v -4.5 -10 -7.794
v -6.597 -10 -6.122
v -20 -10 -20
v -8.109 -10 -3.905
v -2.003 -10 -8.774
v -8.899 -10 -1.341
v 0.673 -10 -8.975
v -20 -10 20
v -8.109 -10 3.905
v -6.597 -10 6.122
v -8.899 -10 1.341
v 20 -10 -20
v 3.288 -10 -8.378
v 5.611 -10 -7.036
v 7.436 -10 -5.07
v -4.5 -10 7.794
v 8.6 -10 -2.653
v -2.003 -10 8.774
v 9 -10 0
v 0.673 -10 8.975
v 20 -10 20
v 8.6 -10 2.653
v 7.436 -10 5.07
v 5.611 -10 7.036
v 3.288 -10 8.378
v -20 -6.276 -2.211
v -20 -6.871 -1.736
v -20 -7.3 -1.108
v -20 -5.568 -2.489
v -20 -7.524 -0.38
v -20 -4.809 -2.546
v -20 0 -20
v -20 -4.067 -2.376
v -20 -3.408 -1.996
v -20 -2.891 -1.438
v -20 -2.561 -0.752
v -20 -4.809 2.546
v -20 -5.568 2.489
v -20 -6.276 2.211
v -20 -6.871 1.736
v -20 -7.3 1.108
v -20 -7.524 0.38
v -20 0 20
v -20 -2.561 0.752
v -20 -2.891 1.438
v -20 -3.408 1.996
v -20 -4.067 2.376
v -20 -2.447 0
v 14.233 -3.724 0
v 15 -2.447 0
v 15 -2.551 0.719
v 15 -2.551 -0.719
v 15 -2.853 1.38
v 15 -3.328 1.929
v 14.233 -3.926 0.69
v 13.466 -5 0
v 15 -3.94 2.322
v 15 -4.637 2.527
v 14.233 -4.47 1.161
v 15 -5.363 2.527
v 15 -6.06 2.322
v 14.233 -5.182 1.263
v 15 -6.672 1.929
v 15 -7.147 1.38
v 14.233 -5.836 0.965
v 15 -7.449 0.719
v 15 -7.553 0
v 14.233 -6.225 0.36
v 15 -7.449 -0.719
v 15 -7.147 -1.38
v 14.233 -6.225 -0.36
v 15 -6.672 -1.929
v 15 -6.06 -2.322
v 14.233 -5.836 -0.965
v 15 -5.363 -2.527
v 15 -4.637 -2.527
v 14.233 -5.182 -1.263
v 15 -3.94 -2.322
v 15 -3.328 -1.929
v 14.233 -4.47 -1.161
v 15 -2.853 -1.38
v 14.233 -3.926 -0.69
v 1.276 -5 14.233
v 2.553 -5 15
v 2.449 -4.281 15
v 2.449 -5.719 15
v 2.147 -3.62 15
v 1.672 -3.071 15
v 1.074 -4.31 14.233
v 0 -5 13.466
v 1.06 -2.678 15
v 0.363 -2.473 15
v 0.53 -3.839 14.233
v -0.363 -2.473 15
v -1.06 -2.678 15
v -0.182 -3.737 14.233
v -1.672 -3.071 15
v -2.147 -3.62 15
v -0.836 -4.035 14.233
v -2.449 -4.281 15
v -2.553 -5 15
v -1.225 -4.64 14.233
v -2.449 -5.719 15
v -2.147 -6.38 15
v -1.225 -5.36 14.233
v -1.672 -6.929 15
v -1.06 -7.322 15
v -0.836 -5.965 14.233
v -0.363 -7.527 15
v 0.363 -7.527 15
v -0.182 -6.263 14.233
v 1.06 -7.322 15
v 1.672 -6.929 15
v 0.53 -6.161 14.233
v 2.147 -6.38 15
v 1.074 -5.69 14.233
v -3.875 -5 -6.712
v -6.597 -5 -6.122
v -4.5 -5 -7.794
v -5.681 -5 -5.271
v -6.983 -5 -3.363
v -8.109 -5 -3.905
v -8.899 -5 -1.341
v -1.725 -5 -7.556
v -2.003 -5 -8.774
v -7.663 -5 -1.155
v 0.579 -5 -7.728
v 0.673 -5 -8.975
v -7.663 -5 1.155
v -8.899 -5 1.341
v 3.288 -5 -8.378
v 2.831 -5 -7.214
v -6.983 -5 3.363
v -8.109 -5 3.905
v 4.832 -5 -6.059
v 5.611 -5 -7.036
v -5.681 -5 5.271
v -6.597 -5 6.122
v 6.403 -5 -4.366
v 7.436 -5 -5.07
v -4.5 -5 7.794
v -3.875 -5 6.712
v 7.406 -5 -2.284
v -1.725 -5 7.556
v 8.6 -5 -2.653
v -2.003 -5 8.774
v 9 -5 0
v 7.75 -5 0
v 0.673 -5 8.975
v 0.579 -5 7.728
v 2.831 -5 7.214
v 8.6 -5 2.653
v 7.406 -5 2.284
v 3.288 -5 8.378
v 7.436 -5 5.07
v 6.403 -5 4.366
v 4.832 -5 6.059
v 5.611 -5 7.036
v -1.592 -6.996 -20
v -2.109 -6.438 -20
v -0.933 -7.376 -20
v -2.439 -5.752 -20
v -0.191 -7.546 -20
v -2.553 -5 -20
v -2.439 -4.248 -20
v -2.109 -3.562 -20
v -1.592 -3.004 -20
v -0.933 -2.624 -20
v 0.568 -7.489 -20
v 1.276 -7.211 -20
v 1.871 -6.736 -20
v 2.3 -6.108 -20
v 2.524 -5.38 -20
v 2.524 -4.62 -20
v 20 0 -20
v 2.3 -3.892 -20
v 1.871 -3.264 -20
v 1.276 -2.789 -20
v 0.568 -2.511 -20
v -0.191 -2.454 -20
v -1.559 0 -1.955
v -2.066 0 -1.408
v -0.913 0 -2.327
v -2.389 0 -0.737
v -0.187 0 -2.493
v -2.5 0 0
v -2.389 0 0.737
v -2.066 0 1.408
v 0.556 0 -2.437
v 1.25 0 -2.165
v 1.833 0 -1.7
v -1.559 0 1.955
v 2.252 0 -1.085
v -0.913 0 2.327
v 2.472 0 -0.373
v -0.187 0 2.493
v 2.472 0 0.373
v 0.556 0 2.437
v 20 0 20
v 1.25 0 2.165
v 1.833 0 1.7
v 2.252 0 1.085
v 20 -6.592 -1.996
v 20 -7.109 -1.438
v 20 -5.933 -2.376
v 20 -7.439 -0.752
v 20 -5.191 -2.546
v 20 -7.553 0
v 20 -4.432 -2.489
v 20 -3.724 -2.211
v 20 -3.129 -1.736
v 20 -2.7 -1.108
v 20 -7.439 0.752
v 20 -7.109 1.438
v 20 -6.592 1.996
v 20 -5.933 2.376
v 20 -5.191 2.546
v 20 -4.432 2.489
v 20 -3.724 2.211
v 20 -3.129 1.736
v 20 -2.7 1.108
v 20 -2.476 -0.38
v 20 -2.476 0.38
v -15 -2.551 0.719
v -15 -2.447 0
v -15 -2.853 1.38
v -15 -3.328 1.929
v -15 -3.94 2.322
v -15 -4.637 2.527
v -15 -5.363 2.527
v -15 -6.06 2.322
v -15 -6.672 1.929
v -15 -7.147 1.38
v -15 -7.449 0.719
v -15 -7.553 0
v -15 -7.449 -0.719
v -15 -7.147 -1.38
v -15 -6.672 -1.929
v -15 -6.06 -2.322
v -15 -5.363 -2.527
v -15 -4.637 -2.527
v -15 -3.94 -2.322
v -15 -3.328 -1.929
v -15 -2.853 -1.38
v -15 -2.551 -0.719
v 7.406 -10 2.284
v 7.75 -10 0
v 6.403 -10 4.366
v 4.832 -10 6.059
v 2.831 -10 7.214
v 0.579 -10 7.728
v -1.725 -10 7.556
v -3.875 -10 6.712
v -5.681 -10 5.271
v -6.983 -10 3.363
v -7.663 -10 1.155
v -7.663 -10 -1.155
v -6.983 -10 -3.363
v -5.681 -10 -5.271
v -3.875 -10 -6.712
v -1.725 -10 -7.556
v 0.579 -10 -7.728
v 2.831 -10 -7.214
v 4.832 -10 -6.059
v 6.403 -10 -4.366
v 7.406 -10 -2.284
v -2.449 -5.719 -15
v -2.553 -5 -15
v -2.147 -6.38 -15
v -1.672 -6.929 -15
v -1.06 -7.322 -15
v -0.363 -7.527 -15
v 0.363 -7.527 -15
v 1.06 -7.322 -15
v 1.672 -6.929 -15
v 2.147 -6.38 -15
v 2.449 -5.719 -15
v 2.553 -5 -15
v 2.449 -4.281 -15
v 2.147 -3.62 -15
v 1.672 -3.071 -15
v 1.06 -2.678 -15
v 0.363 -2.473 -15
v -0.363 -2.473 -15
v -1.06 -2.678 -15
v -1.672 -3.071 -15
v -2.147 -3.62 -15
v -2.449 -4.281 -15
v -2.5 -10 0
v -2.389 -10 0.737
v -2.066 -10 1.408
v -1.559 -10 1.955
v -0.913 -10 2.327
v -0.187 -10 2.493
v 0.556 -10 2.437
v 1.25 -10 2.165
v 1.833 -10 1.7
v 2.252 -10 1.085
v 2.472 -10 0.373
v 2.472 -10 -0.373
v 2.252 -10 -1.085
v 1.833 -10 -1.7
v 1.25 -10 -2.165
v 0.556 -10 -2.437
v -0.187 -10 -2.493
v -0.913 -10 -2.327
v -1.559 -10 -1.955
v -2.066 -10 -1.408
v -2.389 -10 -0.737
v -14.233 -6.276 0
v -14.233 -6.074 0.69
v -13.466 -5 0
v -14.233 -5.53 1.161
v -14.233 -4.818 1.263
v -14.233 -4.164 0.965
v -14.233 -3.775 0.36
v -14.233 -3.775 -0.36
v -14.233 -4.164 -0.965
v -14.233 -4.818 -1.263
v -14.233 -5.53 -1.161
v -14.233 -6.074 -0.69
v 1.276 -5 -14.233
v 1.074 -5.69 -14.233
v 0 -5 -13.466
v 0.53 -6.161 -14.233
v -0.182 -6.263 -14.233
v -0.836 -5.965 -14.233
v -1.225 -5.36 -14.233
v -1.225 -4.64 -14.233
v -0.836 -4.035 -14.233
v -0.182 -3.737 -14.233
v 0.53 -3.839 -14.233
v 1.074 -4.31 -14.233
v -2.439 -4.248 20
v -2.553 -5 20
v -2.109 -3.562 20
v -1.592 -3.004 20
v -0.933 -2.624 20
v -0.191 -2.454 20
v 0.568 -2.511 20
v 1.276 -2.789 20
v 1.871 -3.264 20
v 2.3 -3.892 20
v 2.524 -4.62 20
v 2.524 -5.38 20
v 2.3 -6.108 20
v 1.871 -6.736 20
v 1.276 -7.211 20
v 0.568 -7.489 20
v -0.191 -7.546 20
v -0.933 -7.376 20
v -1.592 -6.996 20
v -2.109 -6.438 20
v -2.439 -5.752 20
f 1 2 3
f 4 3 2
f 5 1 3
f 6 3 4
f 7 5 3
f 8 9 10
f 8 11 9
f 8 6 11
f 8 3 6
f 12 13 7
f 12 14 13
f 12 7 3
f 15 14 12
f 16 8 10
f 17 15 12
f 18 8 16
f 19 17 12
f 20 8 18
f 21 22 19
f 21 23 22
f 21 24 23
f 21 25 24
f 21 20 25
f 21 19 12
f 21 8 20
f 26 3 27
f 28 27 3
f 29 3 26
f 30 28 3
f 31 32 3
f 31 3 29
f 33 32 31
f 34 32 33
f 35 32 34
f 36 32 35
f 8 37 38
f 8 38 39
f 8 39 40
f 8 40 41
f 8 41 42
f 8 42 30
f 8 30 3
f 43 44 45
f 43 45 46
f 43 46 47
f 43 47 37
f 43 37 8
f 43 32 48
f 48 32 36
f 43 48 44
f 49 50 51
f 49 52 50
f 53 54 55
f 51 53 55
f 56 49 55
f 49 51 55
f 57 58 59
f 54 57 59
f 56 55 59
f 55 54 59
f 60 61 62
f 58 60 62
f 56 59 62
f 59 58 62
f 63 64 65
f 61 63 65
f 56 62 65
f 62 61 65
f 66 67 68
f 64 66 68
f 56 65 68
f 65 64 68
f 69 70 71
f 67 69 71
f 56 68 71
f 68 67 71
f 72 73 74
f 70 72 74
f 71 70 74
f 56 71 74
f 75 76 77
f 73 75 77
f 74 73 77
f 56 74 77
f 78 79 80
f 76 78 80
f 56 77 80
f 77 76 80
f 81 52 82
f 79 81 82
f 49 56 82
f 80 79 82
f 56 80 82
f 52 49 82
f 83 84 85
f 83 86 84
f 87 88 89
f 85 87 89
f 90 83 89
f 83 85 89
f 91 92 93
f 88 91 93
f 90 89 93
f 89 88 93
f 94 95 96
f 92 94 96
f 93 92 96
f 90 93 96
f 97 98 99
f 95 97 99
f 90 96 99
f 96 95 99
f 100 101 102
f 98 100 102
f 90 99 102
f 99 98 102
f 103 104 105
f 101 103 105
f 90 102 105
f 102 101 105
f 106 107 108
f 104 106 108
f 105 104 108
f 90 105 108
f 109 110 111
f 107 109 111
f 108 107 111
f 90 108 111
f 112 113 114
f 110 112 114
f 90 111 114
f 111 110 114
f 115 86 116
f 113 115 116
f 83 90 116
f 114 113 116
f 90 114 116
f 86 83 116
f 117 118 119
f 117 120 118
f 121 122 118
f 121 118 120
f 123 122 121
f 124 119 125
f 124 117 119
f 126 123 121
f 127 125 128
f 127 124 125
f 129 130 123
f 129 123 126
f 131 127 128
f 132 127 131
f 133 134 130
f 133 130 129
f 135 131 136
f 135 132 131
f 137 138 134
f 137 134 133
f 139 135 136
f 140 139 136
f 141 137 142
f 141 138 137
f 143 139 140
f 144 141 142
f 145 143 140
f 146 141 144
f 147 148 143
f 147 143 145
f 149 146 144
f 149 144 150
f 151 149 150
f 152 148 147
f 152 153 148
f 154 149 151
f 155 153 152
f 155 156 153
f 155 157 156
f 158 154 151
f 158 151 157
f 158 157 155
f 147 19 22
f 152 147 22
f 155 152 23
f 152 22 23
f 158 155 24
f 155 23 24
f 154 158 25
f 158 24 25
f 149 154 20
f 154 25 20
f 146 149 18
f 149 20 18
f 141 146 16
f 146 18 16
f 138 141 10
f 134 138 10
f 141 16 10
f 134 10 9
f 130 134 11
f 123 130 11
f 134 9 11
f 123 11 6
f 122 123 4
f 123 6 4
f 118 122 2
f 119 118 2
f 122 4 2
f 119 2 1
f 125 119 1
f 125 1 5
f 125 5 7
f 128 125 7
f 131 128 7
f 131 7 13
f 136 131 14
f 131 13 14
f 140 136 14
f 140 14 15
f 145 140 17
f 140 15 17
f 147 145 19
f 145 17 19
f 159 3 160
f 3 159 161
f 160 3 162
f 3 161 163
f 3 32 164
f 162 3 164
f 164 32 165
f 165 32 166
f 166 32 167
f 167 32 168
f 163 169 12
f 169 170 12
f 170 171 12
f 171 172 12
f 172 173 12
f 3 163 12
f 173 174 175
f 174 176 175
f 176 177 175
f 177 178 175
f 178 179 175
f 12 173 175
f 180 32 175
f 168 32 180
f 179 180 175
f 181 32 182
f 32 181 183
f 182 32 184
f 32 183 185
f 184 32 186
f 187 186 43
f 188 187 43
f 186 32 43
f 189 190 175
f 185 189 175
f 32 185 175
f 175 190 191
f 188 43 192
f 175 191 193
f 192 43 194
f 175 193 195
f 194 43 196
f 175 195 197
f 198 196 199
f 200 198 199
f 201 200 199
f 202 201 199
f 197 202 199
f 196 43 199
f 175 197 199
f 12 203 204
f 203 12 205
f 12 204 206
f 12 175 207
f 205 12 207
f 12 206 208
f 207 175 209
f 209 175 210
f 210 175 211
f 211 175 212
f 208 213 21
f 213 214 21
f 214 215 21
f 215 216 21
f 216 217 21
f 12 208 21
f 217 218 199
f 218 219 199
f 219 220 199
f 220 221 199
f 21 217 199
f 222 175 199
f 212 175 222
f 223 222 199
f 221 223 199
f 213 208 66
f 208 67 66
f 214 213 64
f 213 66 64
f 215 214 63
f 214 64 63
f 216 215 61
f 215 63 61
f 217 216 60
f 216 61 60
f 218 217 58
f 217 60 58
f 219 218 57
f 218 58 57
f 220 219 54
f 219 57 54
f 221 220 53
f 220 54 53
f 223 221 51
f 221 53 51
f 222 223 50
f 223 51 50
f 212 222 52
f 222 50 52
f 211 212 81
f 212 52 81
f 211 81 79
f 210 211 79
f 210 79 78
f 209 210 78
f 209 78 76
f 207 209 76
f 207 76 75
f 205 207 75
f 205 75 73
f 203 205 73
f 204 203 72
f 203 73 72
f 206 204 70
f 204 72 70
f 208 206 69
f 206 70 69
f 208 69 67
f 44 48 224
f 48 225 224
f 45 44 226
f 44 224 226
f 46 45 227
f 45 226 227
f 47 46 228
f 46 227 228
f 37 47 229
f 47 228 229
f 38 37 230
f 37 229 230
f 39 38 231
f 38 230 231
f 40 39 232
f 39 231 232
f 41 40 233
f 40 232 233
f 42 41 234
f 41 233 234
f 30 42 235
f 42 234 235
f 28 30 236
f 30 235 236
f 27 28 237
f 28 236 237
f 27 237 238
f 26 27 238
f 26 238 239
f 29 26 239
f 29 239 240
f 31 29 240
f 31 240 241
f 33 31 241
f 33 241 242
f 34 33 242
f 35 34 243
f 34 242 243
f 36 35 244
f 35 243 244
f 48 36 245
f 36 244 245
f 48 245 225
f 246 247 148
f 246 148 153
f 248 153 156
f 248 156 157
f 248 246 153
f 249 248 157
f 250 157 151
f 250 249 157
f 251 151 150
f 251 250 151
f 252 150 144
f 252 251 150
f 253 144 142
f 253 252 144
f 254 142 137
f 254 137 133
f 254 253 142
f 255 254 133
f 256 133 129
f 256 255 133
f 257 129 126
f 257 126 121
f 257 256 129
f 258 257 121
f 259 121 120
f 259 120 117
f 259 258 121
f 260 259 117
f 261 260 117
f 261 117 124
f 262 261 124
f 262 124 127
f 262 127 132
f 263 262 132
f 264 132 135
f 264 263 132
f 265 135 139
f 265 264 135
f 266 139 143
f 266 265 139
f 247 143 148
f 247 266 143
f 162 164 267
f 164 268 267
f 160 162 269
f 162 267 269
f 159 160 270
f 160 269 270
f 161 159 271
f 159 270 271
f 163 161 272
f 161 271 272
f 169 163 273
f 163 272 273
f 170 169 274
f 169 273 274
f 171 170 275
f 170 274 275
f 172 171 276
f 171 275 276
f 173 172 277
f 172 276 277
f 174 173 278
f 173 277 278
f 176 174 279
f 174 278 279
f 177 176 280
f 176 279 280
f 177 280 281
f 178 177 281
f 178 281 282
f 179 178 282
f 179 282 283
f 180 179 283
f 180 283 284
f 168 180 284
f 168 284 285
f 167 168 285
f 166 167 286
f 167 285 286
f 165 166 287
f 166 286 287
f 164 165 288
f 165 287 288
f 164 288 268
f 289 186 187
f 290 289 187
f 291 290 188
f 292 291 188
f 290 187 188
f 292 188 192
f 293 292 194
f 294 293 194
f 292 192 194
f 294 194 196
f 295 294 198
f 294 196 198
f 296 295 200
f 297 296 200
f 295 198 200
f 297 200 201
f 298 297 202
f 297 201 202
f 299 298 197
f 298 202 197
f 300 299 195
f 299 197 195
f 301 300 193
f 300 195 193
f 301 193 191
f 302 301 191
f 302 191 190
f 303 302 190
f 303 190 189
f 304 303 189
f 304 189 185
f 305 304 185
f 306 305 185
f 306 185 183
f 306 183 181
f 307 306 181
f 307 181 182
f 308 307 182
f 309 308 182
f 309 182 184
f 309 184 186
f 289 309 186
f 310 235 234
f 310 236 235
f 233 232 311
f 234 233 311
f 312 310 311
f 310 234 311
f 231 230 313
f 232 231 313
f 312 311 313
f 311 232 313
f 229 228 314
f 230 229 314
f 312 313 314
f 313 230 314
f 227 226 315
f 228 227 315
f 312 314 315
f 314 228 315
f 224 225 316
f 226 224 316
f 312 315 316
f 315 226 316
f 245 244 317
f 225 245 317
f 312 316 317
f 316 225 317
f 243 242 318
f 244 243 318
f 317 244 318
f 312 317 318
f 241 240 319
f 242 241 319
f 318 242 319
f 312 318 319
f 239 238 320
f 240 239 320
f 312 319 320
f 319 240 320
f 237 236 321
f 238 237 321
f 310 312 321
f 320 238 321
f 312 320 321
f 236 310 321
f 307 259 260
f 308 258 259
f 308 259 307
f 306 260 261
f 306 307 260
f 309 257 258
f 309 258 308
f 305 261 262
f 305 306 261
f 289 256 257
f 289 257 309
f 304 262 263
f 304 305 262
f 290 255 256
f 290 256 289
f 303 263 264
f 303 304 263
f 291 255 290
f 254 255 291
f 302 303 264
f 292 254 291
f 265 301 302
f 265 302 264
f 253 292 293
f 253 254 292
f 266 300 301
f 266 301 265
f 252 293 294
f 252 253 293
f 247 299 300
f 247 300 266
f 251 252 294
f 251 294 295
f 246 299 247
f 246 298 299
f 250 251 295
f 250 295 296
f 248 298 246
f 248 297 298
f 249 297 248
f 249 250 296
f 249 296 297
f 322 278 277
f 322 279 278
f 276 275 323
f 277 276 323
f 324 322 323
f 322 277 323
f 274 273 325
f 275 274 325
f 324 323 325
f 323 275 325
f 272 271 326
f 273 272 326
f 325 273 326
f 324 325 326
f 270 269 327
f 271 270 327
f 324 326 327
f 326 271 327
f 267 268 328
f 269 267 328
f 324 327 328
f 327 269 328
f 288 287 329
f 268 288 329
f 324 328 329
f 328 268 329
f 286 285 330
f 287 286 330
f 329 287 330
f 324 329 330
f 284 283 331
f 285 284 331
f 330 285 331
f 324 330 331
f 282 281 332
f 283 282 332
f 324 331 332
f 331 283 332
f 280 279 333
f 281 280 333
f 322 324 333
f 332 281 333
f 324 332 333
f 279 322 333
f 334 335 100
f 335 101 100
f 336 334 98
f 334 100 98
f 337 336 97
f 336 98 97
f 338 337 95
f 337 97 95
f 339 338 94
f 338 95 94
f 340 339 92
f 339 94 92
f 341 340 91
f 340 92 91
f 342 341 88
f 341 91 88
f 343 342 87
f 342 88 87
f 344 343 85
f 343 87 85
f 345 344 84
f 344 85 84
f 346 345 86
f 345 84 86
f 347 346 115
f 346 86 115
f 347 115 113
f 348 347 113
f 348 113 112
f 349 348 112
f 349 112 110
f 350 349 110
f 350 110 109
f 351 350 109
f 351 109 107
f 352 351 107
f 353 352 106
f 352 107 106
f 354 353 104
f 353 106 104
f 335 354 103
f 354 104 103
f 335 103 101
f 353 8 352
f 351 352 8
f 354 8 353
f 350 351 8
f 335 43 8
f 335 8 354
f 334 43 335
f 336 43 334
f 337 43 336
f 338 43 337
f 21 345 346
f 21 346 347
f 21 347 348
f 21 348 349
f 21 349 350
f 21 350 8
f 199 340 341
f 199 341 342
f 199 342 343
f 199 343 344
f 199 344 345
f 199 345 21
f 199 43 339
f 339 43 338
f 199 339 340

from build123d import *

# Parameters (mm, degrees)
F0_W      = 40
F0_H      = 40
F1_DEPTH  = 10
F3_D      = 5
F4_R      = 9
F4_R_2    = 7.75
F5_DEPTH  = 5
F7_D      = 5.1054
F7_DEPTH  = 5
F7_TIP    = 1.5338169022
F9_D      = 5.1054
F9_DEPTH  = 5
F9_TIP    = 1.5338169022
F11_D     = 5.1054
F11_DEPTH = 5
F11_TIP   = 1.5338169022
F13_D     = 5.1054
F13_DEPTH = 5
F13_TIP   = 1.5338169022


with BuildPart() as f1:
    # F0 (on Front) → F1 (new body)
    with BuildSketch(Plane.XZ):
        Rectangle(F0_W, F0_H)
    extrude(amount=F1_DEPTH)

    # F3 (through all)
    with Locations(Plane.XZ.offset(10)):
        with Locations((0, 0)):
            Hole(F3_D / 2)

    # F4 (on face) → F5 (cut)
    with BuildSketch(Plane.XZ.offset(10)):
        Circle(F4_R)
        Circle(F4_R_2, mode=Mode.SUBTRACT)
    extrude(amount=-F5_DEPTH, mode=Mode.SUBTRACT)

    # F7
    with Locations(Plane.XY.offset(20)):
        with Locations((0, -5)):
            Hole(F7_D / 2, depth=F7_DEPTH)
            with Locations((0, 0, -(F7_DEPTH + F7_TIP / 2))):  # 118° drill point
                Cone(0, F7_D / 2, F7_TIP, mode=Mode.SUBTRACT)

    # F9
    with Locations(Plane(origin=(0, 0, -20), x_dir=(1, 0, 0), z_dir=(0, 0, -1))):
        with Locations((0, 5)):
            Hole(F9_D / 2, depth=F9_DEPTH)
            with Locations((0, 0, -(F9_DEPTH + F9_TIP / 2))):  # 118° drill point
                Cone(0, F9_D / 2, F9_TIP, mode=Mode.SUBTRACT)

    # F11
    with Locations(Plane(origin=(-20, 0, 0), x_dir=(0, -1, 0), z_dir=(-1, 0, 0))):
        with Locations((5, 0)):
            Hole(F11_D / 2, depth=F11_DEPTH)
            with Locations((0, 0, -(F11_DEPTH + F11_TIP / 2))):  # 118° drill point
                Cone(0, F11_D / 2, F11_TIP, mode=Mode.SUBTRACT)

    # F13
    with Locations(Plane.YZ.offset(20)):
        with Locations((-5, 0)):
            Hole(F13_D / 2, depth=F13_DEPTH)
            with Locations((0, 0, -(F13_DEPTH + F13_TIP / 2))):  # 118° drill point
                Cone(0, F13_D / 2, F13_TIP, mode=Mode.SUBTRACT)


solid = f1.part
